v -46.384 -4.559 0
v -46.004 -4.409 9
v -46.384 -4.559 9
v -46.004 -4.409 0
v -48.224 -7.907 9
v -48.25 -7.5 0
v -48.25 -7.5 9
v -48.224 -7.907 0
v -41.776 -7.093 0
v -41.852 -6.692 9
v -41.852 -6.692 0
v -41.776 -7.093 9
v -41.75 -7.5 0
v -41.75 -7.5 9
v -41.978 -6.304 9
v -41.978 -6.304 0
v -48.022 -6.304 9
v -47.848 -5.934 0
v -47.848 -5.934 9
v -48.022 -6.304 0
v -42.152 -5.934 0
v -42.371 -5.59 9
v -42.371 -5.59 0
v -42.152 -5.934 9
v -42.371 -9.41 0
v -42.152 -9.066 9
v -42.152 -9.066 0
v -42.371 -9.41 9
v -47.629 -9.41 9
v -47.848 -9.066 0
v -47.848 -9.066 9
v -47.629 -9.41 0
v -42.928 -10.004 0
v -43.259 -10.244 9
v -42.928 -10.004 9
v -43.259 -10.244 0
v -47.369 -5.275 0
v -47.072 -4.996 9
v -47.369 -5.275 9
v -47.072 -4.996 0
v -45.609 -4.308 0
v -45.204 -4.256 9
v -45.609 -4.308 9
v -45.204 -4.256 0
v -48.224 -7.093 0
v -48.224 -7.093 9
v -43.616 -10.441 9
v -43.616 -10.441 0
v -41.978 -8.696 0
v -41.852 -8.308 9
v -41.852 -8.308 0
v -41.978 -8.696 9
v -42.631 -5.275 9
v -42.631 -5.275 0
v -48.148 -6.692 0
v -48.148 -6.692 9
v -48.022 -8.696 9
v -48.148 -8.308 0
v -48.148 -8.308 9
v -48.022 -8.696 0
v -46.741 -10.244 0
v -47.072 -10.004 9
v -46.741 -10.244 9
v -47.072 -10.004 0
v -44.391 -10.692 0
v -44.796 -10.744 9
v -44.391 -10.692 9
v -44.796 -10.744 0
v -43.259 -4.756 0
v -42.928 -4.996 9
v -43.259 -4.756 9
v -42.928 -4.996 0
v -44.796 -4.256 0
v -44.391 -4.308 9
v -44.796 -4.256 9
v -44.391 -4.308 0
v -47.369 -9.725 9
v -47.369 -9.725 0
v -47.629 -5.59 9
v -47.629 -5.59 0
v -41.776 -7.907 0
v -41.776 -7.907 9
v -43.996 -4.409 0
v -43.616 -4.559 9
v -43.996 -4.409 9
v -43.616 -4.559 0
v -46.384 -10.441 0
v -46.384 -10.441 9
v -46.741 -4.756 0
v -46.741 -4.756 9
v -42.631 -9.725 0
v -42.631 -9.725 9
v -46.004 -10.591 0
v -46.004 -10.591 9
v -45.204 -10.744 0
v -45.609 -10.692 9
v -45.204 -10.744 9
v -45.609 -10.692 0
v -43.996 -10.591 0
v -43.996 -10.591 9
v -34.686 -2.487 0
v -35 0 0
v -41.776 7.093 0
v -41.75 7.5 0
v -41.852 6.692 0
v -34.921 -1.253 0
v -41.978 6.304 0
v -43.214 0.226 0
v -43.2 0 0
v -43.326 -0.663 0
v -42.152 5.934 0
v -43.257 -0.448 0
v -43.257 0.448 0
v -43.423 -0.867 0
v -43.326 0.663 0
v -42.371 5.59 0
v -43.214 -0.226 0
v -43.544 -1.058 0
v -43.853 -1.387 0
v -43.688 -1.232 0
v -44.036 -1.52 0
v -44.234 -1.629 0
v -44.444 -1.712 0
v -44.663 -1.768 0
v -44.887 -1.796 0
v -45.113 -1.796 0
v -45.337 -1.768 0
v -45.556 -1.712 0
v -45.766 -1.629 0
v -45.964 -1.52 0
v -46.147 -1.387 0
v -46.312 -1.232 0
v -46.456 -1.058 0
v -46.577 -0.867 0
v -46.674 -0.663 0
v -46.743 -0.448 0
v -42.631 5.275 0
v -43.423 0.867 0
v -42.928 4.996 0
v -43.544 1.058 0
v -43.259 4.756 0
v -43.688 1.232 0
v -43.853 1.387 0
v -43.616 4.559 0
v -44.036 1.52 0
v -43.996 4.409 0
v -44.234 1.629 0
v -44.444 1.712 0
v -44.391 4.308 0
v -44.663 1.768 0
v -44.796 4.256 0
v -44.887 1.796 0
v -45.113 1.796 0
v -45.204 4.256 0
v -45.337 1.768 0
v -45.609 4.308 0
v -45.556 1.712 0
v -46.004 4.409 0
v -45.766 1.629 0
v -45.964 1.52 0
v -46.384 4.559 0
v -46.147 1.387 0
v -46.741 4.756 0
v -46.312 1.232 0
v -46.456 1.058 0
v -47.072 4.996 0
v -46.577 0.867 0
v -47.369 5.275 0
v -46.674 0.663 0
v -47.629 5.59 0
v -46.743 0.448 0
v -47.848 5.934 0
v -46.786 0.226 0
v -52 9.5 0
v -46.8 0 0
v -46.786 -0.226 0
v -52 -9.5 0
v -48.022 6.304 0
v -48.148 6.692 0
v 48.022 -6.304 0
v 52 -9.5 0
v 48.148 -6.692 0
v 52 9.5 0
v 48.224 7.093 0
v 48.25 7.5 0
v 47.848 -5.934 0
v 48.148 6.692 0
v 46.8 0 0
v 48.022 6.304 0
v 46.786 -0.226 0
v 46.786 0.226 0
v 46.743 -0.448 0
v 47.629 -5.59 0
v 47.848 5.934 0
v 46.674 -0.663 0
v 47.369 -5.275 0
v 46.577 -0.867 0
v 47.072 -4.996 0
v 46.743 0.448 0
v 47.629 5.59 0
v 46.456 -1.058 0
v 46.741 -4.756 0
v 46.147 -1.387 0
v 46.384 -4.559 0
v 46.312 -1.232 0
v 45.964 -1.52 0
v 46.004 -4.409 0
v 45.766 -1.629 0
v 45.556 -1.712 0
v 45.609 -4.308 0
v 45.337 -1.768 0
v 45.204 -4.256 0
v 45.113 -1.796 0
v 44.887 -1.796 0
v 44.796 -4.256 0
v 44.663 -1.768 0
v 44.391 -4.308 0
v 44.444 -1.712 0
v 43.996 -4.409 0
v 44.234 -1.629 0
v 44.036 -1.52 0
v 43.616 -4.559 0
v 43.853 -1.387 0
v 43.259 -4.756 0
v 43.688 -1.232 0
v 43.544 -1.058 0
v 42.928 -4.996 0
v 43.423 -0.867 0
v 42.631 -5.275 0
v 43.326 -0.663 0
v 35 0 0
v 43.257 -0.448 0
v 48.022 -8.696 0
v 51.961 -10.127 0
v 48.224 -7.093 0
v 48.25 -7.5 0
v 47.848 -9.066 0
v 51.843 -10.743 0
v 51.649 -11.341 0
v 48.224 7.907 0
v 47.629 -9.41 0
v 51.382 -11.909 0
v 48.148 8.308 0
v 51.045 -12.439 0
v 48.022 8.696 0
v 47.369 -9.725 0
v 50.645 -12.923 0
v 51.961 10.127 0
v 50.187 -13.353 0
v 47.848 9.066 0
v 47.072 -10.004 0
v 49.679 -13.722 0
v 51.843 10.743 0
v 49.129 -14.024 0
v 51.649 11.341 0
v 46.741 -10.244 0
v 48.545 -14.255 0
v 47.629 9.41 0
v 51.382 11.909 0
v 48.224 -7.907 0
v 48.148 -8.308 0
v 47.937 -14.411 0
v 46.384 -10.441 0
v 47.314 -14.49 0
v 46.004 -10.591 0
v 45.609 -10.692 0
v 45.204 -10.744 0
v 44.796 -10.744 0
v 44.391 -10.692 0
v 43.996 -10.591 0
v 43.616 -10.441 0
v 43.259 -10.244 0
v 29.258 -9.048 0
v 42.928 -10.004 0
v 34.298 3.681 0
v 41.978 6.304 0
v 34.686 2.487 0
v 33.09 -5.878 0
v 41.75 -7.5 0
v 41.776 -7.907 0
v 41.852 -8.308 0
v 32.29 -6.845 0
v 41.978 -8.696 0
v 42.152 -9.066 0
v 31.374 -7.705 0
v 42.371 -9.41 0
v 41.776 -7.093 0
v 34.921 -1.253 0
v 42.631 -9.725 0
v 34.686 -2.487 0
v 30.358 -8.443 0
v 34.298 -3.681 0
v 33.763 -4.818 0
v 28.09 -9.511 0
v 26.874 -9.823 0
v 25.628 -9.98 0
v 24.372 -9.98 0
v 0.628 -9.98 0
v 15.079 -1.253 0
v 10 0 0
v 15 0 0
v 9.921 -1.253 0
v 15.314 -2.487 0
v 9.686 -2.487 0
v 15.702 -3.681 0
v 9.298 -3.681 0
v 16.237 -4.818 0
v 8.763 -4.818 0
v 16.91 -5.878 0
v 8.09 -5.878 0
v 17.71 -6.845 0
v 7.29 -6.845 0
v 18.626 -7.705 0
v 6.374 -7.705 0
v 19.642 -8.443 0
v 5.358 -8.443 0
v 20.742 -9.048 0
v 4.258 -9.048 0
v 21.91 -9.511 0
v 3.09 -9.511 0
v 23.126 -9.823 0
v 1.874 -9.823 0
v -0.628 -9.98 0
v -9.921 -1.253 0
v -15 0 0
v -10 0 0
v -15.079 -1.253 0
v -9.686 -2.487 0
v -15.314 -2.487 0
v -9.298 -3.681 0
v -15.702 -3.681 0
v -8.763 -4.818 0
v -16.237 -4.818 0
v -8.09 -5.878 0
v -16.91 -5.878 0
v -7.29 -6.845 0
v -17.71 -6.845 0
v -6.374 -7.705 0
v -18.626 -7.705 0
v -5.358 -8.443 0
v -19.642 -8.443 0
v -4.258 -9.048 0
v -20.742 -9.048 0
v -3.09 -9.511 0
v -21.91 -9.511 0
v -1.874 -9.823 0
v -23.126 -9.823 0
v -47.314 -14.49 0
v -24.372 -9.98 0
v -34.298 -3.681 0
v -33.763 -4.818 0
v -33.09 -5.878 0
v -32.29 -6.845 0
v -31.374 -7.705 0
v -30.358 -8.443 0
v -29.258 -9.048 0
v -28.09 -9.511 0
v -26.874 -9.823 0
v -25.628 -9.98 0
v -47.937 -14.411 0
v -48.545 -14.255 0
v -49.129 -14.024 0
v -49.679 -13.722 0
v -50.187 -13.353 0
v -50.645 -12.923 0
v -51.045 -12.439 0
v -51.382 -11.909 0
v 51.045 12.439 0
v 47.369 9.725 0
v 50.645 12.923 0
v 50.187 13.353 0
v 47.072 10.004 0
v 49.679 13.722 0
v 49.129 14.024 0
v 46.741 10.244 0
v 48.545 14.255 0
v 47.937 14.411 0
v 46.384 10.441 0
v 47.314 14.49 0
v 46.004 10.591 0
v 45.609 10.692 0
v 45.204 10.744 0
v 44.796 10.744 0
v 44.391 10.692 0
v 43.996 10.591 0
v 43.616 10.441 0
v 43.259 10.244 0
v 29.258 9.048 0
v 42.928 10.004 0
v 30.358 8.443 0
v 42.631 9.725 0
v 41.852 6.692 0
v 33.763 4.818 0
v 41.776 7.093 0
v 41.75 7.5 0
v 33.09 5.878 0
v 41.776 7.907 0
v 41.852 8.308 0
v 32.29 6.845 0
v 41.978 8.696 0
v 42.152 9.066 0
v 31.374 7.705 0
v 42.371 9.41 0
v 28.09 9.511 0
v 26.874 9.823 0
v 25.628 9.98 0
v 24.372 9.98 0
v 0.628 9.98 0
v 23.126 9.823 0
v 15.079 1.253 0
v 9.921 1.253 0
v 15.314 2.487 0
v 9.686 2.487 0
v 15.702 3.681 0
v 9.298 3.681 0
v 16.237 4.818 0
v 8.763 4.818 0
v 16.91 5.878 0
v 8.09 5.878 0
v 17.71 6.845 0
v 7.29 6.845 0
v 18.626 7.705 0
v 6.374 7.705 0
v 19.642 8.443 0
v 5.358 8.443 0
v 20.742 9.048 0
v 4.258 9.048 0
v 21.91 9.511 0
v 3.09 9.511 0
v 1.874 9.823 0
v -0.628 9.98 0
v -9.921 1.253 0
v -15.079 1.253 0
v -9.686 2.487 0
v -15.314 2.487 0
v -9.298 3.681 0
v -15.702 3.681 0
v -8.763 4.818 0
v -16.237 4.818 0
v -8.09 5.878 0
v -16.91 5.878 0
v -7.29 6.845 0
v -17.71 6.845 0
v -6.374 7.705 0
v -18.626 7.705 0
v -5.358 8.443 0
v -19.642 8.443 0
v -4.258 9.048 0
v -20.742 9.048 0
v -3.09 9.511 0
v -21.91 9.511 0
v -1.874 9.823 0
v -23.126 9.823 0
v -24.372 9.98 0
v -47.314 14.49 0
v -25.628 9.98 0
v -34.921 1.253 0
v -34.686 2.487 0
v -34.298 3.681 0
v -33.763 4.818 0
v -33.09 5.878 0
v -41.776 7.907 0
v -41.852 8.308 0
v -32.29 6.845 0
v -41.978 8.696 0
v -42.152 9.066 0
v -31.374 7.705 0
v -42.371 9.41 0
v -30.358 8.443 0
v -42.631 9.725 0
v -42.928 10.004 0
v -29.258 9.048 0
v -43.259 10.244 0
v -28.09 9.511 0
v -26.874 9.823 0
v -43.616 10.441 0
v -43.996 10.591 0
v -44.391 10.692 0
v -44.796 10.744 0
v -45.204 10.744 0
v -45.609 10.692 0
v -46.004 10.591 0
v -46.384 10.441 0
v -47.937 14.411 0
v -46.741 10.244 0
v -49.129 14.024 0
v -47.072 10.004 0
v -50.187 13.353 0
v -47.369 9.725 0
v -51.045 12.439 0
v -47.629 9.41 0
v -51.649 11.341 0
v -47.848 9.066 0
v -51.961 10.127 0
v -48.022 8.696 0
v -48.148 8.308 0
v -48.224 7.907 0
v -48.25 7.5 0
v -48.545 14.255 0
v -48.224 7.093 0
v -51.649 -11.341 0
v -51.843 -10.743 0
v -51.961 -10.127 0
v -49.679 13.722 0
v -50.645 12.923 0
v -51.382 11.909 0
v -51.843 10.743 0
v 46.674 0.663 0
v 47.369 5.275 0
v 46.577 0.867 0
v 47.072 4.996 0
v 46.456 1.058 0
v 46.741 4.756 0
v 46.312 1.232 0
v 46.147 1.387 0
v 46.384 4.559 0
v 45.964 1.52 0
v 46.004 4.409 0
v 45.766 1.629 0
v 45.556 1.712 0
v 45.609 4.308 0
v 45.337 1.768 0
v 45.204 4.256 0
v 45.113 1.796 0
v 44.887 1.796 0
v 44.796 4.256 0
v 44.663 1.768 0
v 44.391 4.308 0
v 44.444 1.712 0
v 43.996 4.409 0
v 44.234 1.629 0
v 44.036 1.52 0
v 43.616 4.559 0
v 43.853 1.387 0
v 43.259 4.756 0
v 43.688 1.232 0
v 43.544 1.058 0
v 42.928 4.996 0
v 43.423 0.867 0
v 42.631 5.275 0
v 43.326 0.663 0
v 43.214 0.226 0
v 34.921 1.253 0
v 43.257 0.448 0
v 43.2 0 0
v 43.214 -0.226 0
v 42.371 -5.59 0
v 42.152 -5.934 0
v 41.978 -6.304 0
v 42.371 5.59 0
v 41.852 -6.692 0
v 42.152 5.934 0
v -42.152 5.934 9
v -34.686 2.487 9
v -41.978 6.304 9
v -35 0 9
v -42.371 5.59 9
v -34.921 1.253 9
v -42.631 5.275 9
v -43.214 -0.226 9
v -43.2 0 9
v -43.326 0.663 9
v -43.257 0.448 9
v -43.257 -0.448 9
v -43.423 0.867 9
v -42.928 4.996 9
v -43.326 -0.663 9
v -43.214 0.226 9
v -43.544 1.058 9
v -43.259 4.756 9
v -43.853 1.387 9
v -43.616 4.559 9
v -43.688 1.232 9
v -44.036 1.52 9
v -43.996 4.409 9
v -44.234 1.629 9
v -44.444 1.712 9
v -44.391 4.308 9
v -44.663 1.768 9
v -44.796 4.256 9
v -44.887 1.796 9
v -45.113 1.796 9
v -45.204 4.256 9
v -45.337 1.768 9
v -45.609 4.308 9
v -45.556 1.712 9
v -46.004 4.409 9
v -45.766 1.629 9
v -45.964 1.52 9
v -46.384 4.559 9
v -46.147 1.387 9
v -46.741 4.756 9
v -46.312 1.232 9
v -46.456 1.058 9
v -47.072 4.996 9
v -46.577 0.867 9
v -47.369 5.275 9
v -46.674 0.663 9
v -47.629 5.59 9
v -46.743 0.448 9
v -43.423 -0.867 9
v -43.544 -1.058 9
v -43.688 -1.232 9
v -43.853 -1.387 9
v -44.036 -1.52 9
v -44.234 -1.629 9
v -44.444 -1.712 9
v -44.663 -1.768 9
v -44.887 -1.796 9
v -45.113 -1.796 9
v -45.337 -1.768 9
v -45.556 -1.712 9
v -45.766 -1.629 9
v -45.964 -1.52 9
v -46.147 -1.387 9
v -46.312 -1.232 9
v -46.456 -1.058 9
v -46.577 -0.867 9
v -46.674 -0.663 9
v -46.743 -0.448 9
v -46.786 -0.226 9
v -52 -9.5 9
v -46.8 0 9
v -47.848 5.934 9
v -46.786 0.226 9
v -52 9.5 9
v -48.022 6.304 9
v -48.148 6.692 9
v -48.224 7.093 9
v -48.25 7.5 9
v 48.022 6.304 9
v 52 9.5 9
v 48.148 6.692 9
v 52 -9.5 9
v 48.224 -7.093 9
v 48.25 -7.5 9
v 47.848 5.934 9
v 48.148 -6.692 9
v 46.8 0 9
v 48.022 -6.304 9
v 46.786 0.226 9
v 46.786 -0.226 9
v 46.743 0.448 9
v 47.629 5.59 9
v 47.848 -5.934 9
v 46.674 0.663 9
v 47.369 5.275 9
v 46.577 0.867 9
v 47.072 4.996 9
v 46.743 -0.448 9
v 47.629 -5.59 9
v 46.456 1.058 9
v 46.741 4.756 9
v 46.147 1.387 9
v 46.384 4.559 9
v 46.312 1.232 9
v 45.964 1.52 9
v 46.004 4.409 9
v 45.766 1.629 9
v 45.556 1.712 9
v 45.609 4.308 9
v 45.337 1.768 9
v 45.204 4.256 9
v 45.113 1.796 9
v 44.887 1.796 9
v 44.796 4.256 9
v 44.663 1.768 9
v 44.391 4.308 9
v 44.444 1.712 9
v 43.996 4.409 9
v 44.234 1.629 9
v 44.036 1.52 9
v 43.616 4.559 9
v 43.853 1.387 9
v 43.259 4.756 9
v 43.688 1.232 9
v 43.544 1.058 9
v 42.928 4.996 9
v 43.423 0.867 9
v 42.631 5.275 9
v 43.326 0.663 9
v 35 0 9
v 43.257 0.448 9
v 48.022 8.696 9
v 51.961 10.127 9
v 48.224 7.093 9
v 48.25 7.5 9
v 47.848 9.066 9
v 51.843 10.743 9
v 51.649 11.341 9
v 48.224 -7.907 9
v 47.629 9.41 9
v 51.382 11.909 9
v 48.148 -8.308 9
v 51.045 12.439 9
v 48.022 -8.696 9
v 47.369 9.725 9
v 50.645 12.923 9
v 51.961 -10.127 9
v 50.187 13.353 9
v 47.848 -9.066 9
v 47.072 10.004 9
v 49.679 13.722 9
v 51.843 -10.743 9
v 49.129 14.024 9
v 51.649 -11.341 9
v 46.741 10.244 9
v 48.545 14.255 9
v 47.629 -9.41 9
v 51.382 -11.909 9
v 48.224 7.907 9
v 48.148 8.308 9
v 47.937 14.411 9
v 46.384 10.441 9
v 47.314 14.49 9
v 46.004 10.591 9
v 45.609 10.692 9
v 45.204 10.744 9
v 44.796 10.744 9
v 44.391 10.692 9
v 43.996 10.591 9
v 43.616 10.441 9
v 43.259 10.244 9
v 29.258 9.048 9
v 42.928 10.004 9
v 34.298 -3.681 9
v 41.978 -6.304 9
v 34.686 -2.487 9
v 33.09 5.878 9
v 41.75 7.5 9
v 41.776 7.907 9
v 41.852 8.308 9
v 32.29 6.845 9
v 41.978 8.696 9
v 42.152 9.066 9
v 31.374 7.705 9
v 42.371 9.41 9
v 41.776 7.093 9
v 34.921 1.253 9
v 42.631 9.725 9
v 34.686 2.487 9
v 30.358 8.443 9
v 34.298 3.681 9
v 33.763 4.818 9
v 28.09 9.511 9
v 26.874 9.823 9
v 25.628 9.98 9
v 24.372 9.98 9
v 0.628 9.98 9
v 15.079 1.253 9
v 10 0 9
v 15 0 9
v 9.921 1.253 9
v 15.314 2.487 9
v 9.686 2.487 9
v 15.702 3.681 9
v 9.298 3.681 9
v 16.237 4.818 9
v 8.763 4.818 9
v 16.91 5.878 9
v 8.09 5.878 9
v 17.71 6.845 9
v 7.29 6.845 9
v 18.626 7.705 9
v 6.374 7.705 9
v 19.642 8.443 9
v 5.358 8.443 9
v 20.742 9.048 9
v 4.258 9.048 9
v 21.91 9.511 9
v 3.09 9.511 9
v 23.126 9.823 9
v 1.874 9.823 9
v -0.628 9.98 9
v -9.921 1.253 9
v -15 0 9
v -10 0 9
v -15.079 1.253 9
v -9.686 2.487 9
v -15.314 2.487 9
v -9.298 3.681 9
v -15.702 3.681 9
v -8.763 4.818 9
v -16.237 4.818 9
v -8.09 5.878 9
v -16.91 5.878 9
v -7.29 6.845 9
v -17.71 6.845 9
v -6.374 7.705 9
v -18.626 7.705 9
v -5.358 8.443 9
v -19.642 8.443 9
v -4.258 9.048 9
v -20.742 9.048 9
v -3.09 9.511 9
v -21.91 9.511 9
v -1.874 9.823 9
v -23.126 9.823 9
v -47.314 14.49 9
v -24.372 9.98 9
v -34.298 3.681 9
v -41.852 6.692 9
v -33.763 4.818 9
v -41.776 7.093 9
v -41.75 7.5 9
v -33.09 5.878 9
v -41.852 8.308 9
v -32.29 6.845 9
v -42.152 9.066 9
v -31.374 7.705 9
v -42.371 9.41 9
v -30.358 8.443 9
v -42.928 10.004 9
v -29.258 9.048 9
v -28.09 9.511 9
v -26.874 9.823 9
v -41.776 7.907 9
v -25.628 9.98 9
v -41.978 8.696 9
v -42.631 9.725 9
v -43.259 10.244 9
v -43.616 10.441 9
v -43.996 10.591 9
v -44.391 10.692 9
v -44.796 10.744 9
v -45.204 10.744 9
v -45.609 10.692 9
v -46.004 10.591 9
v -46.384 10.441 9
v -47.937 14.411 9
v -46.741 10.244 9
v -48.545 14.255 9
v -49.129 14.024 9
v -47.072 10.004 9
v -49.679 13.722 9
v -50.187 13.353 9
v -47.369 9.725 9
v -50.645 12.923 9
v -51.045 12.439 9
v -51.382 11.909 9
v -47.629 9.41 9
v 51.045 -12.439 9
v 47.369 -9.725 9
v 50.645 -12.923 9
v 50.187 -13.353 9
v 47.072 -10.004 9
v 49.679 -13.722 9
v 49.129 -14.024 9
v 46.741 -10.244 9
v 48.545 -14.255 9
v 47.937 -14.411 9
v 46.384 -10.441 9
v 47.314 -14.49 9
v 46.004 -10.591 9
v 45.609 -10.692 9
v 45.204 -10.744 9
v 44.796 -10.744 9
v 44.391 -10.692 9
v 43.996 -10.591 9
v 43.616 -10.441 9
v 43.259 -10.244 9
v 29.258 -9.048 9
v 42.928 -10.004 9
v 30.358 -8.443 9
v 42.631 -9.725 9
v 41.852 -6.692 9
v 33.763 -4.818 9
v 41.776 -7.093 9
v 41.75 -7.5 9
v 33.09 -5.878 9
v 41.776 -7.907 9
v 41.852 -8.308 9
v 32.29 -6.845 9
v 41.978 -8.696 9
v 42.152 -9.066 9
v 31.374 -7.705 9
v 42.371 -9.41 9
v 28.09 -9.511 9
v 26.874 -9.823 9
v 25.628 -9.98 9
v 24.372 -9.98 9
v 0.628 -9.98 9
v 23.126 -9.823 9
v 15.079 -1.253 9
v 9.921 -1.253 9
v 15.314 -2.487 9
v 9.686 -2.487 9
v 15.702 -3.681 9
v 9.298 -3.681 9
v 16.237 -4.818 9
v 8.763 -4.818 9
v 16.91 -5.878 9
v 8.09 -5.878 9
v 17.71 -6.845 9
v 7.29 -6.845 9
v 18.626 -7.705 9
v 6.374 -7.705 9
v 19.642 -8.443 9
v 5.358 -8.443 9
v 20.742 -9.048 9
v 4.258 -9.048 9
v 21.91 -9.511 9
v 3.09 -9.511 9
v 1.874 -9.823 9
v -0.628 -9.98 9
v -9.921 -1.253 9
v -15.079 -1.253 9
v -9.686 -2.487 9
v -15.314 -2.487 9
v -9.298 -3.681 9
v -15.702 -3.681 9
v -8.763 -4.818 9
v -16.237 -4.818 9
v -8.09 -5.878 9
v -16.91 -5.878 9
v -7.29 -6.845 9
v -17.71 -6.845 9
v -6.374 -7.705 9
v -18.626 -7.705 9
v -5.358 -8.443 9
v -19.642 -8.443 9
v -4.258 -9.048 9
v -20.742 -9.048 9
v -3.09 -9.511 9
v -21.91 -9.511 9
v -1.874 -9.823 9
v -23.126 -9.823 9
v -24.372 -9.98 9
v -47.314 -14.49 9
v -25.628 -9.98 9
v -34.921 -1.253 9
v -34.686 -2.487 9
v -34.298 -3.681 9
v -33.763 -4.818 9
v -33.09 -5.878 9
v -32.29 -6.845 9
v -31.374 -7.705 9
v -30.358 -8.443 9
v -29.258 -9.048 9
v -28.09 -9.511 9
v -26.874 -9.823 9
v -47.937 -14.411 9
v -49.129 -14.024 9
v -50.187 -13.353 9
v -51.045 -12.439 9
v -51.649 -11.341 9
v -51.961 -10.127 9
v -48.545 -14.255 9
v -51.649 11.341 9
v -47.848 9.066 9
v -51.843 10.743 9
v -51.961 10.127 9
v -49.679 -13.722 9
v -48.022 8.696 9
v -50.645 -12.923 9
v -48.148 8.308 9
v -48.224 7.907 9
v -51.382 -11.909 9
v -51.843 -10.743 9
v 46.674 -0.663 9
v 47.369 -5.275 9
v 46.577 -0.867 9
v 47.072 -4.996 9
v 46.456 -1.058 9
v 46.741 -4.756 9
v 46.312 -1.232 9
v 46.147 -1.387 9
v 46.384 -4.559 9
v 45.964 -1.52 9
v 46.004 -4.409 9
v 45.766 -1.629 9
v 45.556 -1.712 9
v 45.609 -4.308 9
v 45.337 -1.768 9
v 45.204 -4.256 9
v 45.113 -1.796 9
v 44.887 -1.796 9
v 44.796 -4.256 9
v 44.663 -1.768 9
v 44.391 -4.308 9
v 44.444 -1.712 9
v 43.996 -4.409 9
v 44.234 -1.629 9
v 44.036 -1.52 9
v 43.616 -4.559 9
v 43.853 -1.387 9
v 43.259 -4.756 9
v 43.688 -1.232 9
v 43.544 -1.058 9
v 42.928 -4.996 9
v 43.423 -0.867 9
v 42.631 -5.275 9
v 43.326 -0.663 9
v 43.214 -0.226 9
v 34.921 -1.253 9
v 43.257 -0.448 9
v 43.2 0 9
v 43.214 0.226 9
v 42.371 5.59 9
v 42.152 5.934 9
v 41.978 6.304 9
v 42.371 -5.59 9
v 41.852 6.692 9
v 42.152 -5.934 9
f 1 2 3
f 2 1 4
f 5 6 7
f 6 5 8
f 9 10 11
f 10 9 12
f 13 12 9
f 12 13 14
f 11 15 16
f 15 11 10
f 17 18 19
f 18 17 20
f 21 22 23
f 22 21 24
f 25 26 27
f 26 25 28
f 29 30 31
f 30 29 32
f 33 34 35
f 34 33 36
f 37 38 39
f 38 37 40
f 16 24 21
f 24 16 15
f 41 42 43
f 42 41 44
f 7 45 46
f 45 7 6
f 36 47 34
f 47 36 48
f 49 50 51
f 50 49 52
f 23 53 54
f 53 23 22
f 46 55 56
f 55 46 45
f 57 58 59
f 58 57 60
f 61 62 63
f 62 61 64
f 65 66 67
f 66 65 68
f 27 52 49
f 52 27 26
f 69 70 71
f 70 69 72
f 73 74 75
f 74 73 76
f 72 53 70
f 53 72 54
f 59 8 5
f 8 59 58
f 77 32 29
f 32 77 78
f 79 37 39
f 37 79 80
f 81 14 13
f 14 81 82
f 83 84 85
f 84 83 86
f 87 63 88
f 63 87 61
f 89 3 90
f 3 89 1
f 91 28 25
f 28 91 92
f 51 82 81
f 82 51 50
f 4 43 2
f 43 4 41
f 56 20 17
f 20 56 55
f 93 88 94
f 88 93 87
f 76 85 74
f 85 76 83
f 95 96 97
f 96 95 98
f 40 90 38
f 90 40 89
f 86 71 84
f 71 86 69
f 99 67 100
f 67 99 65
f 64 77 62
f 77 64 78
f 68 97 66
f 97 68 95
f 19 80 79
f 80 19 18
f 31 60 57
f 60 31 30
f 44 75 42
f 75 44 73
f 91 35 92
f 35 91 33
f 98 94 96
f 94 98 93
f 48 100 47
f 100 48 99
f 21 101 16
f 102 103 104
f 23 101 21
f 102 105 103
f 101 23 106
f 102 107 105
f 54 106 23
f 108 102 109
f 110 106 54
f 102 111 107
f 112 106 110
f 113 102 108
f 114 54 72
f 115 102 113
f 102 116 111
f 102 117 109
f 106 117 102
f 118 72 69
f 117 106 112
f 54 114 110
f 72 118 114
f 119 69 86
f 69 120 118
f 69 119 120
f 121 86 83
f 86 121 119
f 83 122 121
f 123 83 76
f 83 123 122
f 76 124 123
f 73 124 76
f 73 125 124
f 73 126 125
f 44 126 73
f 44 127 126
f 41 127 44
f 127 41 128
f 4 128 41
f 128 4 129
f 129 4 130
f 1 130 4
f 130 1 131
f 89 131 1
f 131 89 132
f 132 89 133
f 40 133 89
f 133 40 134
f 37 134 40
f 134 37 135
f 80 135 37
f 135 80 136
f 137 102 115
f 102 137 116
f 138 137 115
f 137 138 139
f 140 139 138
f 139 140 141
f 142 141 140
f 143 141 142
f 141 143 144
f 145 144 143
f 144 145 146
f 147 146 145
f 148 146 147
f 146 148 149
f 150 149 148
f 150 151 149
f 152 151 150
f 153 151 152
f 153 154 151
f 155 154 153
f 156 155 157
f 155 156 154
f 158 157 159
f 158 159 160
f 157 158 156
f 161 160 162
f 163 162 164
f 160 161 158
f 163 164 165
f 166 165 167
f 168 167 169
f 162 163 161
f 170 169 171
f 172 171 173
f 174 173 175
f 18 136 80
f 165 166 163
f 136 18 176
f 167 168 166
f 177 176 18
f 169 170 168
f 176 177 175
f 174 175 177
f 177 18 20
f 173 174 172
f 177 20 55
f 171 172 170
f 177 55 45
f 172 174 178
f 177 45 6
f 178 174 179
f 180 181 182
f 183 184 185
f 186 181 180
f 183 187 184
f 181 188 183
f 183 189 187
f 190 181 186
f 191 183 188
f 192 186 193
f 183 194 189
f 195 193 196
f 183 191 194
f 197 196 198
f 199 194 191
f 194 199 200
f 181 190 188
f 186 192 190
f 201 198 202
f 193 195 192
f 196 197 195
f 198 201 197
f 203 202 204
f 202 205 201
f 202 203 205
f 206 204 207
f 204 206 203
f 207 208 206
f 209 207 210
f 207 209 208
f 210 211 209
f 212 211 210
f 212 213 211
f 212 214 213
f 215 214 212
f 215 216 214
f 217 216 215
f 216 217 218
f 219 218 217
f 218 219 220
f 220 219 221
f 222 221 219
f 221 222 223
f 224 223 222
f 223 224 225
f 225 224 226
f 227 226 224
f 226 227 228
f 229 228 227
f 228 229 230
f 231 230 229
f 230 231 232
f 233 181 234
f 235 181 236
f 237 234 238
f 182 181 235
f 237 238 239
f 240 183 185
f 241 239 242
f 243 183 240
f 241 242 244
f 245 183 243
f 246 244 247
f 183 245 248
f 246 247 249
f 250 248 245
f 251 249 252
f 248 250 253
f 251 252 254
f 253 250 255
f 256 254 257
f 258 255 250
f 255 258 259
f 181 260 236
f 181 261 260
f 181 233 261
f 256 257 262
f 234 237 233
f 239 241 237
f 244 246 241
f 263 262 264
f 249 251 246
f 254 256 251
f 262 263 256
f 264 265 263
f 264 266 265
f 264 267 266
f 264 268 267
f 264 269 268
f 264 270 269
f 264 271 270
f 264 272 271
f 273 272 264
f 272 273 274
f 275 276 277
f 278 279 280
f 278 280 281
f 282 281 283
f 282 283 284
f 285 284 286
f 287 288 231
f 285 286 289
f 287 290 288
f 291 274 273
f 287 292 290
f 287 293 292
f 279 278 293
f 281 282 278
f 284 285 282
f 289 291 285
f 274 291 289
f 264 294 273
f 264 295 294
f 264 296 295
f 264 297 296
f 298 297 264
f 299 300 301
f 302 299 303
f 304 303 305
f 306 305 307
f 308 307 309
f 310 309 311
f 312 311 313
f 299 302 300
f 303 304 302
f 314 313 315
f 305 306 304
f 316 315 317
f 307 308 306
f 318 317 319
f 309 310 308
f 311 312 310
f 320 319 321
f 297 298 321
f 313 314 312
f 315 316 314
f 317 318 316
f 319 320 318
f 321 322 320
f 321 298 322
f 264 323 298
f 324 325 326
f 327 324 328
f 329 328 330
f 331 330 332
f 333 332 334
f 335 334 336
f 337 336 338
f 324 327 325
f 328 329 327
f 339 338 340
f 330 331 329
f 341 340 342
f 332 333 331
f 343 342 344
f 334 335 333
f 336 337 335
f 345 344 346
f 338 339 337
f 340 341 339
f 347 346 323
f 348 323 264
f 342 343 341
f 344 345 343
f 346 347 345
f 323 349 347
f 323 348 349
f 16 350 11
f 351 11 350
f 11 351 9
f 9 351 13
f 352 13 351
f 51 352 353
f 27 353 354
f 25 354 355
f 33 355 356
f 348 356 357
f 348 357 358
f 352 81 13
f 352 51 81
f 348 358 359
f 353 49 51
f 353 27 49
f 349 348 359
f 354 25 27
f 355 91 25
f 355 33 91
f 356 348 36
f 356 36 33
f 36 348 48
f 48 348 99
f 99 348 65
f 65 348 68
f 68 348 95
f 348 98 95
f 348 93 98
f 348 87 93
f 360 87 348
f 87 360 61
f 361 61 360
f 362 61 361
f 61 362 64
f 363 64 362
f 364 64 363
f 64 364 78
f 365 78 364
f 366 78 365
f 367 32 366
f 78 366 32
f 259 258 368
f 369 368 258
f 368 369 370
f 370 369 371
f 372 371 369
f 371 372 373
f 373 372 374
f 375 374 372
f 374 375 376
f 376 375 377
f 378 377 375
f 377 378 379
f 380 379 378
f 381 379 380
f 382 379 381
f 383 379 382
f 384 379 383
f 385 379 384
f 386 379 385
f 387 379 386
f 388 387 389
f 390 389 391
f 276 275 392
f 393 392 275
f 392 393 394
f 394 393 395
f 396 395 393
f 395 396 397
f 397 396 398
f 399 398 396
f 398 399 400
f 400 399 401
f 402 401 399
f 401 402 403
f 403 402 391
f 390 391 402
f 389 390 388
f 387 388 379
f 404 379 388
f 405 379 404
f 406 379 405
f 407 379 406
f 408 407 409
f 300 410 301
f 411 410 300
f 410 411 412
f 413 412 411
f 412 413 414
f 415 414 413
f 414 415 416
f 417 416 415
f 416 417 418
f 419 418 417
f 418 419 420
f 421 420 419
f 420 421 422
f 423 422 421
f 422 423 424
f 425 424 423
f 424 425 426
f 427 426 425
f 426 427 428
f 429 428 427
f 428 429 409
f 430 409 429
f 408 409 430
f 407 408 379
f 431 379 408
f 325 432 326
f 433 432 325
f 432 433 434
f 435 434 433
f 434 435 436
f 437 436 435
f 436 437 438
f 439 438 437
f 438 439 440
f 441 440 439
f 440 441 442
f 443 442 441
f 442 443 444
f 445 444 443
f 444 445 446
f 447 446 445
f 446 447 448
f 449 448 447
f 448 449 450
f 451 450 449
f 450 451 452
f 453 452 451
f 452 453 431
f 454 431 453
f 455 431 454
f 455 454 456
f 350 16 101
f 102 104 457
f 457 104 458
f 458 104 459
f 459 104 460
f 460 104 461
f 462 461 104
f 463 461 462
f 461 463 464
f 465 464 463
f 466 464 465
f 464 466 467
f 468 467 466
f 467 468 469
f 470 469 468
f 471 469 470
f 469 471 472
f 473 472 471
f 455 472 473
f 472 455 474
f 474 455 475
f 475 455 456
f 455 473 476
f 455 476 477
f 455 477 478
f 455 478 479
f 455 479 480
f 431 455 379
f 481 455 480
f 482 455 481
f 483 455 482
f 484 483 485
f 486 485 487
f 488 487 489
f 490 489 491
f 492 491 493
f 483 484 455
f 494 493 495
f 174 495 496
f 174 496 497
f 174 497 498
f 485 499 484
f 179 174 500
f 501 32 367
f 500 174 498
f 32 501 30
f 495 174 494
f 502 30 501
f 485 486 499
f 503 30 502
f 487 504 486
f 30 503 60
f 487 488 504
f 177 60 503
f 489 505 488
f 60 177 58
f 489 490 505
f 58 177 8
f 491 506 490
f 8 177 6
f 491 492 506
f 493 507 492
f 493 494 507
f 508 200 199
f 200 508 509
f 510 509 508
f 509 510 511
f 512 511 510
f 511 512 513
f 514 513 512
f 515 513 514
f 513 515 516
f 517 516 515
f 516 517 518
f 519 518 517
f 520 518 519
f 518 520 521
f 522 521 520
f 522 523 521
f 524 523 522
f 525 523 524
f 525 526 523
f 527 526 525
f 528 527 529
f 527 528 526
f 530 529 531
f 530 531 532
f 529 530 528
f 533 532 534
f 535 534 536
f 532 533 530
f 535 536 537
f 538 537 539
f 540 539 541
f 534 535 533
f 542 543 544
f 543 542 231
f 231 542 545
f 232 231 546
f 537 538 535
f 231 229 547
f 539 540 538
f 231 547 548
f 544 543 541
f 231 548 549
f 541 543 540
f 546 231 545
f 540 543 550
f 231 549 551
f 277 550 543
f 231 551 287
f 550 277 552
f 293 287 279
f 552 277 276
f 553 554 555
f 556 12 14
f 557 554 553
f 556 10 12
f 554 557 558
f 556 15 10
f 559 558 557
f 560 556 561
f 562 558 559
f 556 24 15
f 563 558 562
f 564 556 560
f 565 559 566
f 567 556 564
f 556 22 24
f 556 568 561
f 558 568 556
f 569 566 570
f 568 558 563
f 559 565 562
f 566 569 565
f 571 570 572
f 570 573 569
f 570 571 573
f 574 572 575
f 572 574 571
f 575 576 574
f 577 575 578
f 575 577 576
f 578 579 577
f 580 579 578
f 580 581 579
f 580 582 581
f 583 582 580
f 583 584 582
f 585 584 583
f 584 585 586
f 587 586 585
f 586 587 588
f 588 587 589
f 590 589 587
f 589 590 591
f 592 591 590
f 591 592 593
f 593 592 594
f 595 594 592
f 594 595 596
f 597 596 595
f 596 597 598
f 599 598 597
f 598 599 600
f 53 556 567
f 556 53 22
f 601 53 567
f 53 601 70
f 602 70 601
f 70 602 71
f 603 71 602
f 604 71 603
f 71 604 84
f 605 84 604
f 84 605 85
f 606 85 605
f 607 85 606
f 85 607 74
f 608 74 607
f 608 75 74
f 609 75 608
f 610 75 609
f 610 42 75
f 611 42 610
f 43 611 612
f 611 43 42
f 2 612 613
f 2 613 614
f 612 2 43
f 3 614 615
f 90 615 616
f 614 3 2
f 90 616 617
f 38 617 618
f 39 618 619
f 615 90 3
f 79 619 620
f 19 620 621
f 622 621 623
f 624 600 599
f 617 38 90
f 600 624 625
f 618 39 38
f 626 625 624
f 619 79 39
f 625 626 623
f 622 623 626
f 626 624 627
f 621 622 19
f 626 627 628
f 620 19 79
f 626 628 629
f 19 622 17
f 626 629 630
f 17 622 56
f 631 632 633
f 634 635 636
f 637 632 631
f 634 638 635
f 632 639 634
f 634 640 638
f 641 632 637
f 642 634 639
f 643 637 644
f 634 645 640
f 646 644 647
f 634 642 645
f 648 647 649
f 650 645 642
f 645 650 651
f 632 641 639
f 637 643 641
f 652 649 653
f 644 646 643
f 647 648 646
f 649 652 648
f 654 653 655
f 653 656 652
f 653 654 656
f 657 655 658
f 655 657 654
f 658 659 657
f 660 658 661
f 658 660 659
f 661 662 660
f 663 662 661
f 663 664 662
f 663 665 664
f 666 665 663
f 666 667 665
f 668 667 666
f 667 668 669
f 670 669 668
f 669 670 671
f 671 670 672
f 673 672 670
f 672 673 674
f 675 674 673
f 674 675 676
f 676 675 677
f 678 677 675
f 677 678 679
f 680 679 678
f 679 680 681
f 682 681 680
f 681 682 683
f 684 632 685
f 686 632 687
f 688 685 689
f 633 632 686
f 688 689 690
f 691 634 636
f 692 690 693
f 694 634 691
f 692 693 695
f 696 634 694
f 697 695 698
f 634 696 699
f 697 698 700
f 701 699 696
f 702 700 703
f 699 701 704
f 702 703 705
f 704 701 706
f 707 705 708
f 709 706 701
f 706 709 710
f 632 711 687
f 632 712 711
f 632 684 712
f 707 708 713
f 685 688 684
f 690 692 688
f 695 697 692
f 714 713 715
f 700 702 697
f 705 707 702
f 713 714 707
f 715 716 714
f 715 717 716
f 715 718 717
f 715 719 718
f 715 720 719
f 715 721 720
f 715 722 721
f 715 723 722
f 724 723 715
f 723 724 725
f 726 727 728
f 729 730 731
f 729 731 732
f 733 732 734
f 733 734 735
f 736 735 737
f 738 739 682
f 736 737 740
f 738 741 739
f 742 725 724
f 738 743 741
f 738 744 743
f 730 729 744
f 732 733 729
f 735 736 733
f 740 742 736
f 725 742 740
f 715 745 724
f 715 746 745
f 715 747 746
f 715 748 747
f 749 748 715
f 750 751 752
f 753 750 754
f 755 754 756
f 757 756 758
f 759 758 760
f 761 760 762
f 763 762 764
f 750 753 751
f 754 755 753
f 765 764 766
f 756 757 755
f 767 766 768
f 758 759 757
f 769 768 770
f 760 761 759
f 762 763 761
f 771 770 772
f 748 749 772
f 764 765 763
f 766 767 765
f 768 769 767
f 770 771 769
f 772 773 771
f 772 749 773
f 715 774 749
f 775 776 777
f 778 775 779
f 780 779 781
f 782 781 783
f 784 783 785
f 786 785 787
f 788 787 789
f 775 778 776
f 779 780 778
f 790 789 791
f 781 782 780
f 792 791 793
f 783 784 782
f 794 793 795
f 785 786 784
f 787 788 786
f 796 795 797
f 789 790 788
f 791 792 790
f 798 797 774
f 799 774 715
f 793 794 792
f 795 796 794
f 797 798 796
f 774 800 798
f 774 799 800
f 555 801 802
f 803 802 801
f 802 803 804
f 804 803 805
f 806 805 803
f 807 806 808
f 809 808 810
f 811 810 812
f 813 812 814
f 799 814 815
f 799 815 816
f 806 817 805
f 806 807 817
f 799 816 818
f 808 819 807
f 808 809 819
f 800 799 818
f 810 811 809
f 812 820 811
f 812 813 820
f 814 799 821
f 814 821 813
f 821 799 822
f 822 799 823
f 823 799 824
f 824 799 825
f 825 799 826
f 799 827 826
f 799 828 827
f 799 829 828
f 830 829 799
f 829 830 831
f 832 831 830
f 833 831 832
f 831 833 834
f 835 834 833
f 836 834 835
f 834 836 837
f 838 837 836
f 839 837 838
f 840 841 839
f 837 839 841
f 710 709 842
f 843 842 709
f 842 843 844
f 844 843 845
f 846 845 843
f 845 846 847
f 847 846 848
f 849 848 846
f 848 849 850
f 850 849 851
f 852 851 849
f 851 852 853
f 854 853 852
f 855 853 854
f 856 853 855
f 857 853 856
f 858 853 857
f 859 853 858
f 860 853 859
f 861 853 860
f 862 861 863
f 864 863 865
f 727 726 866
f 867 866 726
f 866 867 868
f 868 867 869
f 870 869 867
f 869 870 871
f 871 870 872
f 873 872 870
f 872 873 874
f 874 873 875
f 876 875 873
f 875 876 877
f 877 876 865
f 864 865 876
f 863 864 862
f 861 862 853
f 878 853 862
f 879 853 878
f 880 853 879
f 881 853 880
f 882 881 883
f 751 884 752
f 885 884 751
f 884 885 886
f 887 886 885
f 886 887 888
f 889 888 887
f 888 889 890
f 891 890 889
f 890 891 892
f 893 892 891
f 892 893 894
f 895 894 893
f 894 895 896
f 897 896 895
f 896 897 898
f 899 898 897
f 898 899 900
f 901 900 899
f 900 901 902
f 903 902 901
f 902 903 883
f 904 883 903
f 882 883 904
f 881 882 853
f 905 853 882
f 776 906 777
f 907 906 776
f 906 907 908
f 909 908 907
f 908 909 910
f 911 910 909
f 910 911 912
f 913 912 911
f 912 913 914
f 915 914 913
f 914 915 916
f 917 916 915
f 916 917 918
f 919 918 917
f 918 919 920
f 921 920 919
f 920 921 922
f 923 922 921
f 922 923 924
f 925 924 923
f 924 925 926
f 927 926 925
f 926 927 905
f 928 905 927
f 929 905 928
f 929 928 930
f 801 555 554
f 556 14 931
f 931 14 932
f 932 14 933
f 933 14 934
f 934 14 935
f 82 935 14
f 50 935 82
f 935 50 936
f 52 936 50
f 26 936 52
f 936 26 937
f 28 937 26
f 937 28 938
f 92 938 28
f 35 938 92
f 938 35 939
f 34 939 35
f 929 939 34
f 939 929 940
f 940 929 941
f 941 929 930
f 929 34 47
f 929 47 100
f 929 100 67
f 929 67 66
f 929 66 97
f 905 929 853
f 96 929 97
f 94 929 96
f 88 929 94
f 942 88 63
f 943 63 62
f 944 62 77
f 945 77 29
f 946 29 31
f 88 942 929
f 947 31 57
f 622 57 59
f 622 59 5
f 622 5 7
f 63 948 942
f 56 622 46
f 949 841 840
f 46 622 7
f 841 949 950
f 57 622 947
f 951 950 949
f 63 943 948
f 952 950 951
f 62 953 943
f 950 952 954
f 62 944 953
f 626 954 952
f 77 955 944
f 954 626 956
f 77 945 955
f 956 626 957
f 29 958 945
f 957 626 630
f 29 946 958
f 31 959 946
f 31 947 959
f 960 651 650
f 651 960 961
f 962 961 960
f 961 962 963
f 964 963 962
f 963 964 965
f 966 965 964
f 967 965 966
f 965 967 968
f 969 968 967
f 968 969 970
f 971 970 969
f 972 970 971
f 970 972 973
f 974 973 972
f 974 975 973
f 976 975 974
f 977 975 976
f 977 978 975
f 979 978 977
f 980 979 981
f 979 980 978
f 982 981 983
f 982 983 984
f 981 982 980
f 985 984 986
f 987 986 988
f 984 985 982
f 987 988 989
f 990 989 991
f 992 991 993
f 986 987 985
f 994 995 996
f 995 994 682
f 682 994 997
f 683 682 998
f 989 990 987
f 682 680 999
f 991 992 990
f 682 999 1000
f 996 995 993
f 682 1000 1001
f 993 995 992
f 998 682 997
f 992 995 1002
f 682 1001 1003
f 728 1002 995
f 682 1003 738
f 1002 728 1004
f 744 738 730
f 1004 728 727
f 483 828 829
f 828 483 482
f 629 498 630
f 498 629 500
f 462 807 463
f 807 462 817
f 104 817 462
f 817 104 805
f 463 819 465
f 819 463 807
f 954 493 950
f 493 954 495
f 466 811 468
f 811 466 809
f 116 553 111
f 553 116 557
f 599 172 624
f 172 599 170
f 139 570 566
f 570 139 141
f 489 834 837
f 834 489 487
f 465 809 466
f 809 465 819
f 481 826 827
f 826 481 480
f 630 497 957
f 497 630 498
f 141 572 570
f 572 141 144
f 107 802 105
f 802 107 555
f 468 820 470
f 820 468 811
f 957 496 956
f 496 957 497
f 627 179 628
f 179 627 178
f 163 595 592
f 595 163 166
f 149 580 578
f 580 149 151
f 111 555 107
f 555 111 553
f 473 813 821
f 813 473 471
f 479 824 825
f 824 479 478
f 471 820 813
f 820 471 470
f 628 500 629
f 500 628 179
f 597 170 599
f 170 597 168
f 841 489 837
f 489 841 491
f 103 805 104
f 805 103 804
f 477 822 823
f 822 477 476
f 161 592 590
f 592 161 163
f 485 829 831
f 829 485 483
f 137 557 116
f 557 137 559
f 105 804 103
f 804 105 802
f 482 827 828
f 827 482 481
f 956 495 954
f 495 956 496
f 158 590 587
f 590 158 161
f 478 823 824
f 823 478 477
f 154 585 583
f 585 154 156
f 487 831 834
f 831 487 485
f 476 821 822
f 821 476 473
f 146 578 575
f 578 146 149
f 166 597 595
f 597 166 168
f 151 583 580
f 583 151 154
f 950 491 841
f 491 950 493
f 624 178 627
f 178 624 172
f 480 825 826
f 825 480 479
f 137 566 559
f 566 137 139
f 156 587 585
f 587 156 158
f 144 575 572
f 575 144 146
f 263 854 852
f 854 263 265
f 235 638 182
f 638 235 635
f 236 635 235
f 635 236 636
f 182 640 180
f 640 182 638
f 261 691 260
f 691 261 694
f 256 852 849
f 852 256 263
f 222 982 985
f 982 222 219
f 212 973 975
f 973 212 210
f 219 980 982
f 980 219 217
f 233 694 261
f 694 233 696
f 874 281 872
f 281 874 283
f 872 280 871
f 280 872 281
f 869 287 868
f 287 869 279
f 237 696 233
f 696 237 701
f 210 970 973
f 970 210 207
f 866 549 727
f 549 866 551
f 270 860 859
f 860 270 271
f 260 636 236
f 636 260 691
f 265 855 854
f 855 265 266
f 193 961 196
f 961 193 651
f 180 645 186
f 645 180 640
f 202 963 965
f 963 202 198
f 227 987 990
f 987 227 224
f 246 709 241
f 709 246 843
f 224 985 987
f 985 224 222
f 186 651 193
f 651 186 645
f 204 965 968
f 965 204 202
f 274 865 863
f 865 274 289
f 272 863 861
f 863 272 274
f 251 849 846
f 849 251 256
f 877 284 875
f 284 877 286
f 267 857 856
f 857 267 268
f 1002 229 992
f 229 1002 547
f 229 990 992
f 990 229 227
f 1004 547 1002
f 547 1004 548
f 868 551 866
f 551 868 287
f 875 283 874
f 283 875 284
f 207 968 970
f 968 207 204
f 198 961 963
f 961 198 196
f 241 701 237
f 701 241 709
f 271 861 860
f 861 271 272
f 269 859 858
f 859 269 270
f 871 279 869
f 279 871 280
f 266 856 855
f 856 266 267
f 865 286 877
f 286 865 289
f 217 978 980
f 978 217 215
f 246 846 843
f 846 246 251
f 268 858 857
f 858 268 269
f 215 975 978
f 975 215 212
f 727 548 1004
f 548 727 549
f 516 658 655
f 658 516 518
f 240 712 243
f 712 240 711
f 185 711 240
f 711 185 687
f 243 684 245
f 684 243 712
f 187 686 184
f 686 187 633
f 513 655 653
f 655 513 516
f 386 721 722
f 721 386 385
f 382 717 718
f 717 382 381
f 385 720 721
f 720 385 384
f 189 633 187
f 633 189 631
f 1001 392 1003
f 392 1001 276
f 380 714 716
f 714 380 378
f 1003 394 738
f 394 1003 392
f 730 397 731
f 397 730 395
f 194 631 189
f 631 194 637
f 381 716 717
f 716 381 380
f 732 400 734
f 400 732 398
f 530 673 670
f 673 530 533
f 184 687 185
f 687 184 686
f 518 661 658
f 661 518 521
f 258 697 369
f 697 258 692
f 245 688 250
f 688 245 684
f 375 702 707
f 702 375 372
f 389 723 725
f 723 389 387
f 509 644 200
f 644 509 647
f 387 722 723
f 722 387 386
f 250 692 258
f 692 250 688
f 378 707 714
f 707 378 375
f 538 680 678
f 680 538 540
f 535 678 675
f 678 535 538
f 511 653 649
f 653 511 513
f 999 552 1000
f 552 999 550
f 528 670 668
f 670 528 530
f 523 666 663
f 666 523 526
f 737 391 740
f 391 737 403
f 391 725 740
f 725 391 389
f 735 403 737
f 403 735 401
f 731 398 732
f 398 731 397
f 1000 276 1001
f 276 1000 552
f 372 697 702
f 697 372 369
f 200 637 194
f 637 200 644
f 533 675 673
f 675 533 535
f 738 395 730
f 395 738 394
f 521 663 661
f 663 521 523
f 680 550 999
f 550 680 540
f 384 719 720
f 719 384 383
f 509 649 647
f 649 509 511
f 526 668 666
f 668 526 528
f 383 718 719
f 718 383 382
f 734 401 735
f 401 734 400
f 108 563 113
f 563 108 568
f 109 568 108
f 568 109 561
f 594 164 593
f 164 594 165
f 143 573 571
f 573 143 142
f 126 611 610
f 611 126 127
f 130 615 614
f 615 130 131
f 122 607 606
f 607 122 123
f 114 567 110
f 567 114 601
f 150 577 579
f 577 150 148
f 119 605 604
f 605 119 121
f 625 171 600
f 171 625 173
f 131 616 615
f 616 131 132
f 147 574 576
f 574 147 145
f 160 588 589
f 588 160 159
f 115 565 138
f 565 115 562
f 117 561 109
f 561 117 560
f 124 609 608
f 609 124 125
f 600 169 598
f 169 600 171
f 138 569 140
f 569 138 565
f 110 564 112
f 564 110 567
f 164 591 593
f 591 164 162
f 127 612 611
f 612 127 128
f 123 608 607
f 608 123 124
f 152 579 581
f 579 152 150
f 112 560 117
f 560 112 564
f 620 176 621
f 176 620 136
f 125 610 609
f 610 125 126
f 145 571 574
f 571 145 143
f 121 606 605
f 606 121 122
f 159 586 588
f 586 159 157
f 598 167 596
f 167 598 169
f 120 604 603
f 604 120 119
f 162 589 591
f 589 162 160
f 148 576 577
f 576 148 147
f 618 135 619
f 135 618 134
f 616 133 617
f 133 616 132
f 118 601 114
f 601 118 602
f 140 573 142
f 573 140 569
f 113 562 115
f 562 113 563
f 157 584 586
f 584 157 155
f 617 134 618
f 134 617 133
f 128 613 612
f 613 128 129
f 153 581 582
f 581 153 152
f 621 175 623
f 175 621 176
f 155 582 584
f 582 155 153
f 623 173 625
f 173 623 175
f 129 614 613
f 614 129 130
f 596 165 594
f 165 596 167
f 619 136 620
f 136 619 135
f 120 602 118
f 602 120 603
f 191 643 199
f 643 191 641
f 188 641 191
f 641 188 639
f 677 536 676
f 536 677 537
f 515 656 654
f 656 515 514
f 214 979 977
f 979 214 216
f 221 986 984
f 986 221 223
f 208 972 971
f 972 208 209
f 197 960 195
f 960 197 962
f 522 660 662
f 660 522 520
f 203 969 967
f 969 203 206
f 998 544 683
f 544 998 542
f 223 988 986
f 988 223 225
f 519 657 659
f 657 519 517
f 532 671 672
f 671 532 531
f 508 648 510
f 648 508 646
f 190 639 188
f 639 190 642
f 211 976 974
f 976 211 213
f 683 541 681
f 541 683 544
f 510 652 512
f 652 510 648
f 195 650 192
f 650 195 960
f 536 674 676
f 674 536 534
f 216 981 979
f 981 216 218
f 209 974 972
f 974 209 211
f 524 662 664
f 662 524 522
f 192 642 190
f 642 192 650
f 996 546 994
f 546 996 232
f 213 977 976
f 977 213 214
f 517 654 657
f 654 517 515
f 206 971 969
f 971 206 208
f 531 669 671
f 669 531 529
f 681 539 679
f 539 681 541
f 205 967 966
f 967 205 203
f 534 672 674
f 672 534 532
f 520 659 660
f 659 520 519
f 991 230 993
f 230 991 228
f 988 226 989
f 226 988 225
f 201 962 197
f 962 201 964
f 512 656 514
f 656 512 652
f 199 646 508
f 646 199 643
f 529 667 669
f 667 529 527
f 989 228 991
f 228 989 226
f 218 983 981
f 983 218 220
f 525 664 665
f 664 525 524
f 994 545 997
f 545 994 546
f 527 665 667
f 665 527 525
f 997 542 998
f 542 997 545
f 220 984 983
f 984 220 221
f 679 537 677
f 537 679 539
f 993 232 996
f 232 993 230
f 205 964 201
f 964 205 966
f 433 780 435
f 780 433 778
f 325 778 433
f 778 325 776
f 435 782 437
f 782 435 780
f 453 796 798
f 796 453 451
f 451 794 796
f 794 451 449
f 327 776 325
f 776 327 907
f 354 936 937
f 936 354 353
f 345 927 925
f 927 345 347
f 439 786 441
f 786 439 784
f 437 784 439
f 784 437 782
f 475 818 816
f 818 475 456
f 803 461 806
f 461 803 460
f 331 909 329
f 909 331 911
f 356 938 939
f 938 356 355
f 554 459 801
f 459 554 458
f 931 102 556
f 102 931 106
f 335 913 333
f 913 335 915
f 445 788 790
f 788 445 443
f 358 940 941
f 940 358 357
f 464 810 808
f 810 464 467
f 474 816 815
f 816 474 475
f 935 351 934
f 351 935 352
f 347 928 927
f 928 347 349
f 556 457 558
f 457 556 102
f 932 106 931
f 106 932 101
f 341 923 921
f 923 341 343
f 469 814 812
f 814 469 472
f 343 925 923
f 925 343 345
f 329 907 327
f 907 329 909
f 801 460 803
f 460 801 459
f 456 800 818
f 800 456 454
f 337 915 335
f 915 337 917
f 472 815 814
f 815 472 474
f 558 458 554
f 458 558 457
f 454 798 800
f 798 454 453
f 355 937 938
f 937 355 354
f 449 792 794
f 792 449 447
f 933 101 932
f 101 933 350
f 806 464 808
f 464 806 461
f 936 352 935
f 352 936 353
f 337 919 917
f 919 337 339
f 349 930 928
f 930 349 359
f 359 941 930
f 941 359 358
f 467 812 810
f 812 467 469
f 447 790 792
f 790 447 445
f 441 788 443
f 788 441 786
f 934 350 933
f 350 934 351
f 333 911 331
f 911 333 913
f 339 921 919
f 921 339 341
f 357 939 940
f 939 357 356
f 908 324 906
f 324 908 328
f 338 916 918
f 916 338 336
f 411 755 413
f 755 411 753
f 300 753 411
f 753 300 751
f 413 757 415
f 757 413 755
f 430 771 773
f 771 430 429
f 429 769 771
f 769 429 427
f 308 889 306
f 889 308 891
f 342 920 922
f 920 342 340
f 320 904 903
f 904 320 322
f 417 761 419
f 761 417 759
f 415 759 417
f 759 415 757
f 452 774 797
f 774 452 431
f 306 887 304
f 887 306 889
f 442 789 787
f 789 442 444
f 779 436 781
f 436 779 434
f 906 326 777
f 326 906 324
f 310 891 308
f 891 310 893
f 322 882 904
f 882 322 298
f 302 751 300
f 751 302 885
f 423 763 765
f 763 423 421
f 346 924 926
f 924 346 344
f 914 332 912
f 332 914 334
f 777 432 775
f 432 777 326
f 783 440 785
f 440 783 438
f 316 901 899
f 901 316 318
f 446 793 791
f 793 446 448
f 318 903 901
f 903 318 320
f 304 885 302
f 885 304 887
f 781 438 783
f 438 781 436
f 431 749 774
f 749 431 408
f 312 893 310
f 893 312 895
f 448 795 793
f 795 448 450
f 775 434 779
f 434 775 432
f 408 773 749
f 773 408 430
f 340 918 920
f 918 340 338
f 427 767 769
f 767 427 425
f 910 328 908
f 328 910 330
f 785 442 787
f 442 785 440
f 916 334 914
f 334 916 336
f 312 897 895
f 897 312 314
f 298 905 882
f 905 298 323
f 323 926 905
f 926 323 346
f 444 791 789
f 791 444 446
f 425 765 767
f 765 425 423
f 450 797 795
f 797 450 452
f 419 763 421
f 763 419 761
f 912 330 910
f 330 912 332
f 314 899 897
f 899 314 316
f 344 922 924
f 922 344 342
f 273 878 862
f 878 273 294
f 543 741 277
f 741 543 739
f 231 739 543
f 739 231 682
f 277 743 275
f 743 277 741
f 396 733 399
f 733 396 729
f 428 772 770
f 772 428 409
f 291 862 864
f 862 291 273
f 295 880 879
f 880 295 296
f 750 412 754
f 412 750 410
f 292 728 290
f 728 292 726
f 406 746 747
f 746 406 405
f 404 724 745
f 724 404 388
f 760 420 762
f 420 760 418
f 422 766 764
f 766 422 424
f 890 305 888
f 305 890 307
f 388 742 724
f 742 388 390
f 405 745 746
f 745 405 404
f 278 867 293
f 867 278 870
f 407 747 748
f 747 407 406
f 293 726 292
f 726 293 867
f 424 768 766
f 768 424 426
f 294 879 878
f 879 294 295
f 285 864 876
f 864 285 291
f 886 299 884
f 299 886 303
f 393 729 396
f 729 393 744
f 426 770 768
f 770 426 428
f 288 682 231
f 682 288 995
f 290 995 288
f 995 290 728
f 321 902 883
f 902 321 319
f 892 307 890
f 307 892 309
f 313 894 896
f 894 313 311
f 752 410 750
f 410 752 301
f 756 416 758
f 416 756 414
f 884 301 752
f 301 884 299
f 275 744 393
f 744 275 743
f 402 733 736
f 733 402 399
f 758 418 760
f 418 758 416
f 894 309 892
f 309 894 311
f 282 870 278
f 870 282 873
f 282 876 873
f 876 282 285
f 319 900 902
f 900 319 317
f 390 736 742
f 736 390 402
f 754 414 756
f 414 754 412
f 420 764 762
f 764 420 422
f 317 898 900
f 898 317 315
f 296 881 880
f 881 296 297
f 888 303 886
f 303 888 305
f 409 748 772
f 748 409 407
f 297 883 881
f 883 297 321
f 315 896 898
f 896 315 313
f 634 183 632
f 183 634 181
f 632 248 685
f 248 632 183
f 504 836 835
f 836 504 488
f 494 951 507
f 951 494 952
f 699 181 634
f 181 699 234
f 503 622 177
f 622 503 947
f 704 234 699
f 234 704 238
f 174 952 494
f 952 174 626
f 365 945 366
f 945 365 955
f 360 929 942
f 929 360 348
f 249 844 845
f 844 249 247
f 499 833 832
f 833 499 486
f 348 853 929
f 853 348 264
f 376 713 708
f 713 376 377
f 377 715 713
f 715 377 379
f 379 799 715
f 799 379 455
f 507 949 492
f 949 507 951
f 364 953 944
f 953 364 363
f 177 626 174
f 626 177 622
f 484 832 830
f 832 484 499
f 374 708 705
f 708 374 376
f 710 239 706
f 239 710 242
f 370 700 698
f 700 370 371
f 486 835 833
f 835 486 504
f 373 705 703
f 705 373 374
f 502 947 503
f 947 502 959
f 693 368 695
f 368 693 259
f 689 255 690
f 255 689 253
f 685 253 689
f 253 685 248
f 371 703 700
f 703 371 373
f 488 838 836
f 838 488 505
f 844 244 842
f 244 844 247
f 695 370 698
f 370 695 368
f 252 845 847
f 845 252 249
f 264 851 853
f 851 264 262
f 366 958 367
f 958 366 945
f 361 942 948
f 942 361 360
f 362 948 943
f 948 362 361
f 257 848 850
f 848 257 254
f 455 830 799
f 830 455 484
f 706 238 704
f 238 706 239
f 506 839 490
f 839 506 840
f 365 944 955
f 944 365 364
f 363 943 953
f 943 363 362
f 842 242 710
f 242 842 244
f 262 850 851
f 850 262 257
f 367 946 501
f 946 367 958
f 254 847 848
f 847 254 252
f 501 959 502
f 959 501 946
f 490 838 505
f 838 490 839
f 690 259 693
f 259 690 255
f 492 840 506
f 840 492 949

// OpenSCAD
$fn = 50;

difference() {
	union() {
		hull() {
			translate(v = [-47.0, 9.5, 0]) {
				cylinder(h = 9, r = 5);
			}
			translate(v = [47.0, 9.5, 0]) {
				cylinder(h = 9, r = 5);
			}
			translate(v = [-47.0, -9.5, 0]) {
				cylinder(h = 9, r = 5);
			}
			translate(v = [47.0, -9.5, 0]) {
				cylinder(h = 9, r = 5);
			}
		}
	}
	union() {
		translate(v = [-45.0, -7.5, 0]) {
			cylinder(h = 9, r = 3.25);
		}
		translate(v = [-45.0, 7.5, 0]) {
			cylinder(h = 9, r = 3.25);
		}
		translate(v = [45.0, -7.5, 0]) {
			cylinder(h = 9, r = 3.25);
		}
		translate(v = [45.0, 7.5, 0]) {
			cylinder(h = 9, r = 3.25);
		}
		translate(v = [-45.0, 0.0, 0]) {
			cylinder(h = 9, r = 1.8);
		}
		translate(v = [45.0, 0.0, 0]) {
			cylinder(h = 9, r = 1.8);
		}
		translate(v = [-25.0, 0, 0.0]) {
			cylinder(h = 9, r = 10.0);
		}
		cylinder(h = 9, r = 10.0);
		translate(v = [25.0, 0, 0.0]) {
			cylinder(h = 9, r = 10.0);
		}
	}
}
